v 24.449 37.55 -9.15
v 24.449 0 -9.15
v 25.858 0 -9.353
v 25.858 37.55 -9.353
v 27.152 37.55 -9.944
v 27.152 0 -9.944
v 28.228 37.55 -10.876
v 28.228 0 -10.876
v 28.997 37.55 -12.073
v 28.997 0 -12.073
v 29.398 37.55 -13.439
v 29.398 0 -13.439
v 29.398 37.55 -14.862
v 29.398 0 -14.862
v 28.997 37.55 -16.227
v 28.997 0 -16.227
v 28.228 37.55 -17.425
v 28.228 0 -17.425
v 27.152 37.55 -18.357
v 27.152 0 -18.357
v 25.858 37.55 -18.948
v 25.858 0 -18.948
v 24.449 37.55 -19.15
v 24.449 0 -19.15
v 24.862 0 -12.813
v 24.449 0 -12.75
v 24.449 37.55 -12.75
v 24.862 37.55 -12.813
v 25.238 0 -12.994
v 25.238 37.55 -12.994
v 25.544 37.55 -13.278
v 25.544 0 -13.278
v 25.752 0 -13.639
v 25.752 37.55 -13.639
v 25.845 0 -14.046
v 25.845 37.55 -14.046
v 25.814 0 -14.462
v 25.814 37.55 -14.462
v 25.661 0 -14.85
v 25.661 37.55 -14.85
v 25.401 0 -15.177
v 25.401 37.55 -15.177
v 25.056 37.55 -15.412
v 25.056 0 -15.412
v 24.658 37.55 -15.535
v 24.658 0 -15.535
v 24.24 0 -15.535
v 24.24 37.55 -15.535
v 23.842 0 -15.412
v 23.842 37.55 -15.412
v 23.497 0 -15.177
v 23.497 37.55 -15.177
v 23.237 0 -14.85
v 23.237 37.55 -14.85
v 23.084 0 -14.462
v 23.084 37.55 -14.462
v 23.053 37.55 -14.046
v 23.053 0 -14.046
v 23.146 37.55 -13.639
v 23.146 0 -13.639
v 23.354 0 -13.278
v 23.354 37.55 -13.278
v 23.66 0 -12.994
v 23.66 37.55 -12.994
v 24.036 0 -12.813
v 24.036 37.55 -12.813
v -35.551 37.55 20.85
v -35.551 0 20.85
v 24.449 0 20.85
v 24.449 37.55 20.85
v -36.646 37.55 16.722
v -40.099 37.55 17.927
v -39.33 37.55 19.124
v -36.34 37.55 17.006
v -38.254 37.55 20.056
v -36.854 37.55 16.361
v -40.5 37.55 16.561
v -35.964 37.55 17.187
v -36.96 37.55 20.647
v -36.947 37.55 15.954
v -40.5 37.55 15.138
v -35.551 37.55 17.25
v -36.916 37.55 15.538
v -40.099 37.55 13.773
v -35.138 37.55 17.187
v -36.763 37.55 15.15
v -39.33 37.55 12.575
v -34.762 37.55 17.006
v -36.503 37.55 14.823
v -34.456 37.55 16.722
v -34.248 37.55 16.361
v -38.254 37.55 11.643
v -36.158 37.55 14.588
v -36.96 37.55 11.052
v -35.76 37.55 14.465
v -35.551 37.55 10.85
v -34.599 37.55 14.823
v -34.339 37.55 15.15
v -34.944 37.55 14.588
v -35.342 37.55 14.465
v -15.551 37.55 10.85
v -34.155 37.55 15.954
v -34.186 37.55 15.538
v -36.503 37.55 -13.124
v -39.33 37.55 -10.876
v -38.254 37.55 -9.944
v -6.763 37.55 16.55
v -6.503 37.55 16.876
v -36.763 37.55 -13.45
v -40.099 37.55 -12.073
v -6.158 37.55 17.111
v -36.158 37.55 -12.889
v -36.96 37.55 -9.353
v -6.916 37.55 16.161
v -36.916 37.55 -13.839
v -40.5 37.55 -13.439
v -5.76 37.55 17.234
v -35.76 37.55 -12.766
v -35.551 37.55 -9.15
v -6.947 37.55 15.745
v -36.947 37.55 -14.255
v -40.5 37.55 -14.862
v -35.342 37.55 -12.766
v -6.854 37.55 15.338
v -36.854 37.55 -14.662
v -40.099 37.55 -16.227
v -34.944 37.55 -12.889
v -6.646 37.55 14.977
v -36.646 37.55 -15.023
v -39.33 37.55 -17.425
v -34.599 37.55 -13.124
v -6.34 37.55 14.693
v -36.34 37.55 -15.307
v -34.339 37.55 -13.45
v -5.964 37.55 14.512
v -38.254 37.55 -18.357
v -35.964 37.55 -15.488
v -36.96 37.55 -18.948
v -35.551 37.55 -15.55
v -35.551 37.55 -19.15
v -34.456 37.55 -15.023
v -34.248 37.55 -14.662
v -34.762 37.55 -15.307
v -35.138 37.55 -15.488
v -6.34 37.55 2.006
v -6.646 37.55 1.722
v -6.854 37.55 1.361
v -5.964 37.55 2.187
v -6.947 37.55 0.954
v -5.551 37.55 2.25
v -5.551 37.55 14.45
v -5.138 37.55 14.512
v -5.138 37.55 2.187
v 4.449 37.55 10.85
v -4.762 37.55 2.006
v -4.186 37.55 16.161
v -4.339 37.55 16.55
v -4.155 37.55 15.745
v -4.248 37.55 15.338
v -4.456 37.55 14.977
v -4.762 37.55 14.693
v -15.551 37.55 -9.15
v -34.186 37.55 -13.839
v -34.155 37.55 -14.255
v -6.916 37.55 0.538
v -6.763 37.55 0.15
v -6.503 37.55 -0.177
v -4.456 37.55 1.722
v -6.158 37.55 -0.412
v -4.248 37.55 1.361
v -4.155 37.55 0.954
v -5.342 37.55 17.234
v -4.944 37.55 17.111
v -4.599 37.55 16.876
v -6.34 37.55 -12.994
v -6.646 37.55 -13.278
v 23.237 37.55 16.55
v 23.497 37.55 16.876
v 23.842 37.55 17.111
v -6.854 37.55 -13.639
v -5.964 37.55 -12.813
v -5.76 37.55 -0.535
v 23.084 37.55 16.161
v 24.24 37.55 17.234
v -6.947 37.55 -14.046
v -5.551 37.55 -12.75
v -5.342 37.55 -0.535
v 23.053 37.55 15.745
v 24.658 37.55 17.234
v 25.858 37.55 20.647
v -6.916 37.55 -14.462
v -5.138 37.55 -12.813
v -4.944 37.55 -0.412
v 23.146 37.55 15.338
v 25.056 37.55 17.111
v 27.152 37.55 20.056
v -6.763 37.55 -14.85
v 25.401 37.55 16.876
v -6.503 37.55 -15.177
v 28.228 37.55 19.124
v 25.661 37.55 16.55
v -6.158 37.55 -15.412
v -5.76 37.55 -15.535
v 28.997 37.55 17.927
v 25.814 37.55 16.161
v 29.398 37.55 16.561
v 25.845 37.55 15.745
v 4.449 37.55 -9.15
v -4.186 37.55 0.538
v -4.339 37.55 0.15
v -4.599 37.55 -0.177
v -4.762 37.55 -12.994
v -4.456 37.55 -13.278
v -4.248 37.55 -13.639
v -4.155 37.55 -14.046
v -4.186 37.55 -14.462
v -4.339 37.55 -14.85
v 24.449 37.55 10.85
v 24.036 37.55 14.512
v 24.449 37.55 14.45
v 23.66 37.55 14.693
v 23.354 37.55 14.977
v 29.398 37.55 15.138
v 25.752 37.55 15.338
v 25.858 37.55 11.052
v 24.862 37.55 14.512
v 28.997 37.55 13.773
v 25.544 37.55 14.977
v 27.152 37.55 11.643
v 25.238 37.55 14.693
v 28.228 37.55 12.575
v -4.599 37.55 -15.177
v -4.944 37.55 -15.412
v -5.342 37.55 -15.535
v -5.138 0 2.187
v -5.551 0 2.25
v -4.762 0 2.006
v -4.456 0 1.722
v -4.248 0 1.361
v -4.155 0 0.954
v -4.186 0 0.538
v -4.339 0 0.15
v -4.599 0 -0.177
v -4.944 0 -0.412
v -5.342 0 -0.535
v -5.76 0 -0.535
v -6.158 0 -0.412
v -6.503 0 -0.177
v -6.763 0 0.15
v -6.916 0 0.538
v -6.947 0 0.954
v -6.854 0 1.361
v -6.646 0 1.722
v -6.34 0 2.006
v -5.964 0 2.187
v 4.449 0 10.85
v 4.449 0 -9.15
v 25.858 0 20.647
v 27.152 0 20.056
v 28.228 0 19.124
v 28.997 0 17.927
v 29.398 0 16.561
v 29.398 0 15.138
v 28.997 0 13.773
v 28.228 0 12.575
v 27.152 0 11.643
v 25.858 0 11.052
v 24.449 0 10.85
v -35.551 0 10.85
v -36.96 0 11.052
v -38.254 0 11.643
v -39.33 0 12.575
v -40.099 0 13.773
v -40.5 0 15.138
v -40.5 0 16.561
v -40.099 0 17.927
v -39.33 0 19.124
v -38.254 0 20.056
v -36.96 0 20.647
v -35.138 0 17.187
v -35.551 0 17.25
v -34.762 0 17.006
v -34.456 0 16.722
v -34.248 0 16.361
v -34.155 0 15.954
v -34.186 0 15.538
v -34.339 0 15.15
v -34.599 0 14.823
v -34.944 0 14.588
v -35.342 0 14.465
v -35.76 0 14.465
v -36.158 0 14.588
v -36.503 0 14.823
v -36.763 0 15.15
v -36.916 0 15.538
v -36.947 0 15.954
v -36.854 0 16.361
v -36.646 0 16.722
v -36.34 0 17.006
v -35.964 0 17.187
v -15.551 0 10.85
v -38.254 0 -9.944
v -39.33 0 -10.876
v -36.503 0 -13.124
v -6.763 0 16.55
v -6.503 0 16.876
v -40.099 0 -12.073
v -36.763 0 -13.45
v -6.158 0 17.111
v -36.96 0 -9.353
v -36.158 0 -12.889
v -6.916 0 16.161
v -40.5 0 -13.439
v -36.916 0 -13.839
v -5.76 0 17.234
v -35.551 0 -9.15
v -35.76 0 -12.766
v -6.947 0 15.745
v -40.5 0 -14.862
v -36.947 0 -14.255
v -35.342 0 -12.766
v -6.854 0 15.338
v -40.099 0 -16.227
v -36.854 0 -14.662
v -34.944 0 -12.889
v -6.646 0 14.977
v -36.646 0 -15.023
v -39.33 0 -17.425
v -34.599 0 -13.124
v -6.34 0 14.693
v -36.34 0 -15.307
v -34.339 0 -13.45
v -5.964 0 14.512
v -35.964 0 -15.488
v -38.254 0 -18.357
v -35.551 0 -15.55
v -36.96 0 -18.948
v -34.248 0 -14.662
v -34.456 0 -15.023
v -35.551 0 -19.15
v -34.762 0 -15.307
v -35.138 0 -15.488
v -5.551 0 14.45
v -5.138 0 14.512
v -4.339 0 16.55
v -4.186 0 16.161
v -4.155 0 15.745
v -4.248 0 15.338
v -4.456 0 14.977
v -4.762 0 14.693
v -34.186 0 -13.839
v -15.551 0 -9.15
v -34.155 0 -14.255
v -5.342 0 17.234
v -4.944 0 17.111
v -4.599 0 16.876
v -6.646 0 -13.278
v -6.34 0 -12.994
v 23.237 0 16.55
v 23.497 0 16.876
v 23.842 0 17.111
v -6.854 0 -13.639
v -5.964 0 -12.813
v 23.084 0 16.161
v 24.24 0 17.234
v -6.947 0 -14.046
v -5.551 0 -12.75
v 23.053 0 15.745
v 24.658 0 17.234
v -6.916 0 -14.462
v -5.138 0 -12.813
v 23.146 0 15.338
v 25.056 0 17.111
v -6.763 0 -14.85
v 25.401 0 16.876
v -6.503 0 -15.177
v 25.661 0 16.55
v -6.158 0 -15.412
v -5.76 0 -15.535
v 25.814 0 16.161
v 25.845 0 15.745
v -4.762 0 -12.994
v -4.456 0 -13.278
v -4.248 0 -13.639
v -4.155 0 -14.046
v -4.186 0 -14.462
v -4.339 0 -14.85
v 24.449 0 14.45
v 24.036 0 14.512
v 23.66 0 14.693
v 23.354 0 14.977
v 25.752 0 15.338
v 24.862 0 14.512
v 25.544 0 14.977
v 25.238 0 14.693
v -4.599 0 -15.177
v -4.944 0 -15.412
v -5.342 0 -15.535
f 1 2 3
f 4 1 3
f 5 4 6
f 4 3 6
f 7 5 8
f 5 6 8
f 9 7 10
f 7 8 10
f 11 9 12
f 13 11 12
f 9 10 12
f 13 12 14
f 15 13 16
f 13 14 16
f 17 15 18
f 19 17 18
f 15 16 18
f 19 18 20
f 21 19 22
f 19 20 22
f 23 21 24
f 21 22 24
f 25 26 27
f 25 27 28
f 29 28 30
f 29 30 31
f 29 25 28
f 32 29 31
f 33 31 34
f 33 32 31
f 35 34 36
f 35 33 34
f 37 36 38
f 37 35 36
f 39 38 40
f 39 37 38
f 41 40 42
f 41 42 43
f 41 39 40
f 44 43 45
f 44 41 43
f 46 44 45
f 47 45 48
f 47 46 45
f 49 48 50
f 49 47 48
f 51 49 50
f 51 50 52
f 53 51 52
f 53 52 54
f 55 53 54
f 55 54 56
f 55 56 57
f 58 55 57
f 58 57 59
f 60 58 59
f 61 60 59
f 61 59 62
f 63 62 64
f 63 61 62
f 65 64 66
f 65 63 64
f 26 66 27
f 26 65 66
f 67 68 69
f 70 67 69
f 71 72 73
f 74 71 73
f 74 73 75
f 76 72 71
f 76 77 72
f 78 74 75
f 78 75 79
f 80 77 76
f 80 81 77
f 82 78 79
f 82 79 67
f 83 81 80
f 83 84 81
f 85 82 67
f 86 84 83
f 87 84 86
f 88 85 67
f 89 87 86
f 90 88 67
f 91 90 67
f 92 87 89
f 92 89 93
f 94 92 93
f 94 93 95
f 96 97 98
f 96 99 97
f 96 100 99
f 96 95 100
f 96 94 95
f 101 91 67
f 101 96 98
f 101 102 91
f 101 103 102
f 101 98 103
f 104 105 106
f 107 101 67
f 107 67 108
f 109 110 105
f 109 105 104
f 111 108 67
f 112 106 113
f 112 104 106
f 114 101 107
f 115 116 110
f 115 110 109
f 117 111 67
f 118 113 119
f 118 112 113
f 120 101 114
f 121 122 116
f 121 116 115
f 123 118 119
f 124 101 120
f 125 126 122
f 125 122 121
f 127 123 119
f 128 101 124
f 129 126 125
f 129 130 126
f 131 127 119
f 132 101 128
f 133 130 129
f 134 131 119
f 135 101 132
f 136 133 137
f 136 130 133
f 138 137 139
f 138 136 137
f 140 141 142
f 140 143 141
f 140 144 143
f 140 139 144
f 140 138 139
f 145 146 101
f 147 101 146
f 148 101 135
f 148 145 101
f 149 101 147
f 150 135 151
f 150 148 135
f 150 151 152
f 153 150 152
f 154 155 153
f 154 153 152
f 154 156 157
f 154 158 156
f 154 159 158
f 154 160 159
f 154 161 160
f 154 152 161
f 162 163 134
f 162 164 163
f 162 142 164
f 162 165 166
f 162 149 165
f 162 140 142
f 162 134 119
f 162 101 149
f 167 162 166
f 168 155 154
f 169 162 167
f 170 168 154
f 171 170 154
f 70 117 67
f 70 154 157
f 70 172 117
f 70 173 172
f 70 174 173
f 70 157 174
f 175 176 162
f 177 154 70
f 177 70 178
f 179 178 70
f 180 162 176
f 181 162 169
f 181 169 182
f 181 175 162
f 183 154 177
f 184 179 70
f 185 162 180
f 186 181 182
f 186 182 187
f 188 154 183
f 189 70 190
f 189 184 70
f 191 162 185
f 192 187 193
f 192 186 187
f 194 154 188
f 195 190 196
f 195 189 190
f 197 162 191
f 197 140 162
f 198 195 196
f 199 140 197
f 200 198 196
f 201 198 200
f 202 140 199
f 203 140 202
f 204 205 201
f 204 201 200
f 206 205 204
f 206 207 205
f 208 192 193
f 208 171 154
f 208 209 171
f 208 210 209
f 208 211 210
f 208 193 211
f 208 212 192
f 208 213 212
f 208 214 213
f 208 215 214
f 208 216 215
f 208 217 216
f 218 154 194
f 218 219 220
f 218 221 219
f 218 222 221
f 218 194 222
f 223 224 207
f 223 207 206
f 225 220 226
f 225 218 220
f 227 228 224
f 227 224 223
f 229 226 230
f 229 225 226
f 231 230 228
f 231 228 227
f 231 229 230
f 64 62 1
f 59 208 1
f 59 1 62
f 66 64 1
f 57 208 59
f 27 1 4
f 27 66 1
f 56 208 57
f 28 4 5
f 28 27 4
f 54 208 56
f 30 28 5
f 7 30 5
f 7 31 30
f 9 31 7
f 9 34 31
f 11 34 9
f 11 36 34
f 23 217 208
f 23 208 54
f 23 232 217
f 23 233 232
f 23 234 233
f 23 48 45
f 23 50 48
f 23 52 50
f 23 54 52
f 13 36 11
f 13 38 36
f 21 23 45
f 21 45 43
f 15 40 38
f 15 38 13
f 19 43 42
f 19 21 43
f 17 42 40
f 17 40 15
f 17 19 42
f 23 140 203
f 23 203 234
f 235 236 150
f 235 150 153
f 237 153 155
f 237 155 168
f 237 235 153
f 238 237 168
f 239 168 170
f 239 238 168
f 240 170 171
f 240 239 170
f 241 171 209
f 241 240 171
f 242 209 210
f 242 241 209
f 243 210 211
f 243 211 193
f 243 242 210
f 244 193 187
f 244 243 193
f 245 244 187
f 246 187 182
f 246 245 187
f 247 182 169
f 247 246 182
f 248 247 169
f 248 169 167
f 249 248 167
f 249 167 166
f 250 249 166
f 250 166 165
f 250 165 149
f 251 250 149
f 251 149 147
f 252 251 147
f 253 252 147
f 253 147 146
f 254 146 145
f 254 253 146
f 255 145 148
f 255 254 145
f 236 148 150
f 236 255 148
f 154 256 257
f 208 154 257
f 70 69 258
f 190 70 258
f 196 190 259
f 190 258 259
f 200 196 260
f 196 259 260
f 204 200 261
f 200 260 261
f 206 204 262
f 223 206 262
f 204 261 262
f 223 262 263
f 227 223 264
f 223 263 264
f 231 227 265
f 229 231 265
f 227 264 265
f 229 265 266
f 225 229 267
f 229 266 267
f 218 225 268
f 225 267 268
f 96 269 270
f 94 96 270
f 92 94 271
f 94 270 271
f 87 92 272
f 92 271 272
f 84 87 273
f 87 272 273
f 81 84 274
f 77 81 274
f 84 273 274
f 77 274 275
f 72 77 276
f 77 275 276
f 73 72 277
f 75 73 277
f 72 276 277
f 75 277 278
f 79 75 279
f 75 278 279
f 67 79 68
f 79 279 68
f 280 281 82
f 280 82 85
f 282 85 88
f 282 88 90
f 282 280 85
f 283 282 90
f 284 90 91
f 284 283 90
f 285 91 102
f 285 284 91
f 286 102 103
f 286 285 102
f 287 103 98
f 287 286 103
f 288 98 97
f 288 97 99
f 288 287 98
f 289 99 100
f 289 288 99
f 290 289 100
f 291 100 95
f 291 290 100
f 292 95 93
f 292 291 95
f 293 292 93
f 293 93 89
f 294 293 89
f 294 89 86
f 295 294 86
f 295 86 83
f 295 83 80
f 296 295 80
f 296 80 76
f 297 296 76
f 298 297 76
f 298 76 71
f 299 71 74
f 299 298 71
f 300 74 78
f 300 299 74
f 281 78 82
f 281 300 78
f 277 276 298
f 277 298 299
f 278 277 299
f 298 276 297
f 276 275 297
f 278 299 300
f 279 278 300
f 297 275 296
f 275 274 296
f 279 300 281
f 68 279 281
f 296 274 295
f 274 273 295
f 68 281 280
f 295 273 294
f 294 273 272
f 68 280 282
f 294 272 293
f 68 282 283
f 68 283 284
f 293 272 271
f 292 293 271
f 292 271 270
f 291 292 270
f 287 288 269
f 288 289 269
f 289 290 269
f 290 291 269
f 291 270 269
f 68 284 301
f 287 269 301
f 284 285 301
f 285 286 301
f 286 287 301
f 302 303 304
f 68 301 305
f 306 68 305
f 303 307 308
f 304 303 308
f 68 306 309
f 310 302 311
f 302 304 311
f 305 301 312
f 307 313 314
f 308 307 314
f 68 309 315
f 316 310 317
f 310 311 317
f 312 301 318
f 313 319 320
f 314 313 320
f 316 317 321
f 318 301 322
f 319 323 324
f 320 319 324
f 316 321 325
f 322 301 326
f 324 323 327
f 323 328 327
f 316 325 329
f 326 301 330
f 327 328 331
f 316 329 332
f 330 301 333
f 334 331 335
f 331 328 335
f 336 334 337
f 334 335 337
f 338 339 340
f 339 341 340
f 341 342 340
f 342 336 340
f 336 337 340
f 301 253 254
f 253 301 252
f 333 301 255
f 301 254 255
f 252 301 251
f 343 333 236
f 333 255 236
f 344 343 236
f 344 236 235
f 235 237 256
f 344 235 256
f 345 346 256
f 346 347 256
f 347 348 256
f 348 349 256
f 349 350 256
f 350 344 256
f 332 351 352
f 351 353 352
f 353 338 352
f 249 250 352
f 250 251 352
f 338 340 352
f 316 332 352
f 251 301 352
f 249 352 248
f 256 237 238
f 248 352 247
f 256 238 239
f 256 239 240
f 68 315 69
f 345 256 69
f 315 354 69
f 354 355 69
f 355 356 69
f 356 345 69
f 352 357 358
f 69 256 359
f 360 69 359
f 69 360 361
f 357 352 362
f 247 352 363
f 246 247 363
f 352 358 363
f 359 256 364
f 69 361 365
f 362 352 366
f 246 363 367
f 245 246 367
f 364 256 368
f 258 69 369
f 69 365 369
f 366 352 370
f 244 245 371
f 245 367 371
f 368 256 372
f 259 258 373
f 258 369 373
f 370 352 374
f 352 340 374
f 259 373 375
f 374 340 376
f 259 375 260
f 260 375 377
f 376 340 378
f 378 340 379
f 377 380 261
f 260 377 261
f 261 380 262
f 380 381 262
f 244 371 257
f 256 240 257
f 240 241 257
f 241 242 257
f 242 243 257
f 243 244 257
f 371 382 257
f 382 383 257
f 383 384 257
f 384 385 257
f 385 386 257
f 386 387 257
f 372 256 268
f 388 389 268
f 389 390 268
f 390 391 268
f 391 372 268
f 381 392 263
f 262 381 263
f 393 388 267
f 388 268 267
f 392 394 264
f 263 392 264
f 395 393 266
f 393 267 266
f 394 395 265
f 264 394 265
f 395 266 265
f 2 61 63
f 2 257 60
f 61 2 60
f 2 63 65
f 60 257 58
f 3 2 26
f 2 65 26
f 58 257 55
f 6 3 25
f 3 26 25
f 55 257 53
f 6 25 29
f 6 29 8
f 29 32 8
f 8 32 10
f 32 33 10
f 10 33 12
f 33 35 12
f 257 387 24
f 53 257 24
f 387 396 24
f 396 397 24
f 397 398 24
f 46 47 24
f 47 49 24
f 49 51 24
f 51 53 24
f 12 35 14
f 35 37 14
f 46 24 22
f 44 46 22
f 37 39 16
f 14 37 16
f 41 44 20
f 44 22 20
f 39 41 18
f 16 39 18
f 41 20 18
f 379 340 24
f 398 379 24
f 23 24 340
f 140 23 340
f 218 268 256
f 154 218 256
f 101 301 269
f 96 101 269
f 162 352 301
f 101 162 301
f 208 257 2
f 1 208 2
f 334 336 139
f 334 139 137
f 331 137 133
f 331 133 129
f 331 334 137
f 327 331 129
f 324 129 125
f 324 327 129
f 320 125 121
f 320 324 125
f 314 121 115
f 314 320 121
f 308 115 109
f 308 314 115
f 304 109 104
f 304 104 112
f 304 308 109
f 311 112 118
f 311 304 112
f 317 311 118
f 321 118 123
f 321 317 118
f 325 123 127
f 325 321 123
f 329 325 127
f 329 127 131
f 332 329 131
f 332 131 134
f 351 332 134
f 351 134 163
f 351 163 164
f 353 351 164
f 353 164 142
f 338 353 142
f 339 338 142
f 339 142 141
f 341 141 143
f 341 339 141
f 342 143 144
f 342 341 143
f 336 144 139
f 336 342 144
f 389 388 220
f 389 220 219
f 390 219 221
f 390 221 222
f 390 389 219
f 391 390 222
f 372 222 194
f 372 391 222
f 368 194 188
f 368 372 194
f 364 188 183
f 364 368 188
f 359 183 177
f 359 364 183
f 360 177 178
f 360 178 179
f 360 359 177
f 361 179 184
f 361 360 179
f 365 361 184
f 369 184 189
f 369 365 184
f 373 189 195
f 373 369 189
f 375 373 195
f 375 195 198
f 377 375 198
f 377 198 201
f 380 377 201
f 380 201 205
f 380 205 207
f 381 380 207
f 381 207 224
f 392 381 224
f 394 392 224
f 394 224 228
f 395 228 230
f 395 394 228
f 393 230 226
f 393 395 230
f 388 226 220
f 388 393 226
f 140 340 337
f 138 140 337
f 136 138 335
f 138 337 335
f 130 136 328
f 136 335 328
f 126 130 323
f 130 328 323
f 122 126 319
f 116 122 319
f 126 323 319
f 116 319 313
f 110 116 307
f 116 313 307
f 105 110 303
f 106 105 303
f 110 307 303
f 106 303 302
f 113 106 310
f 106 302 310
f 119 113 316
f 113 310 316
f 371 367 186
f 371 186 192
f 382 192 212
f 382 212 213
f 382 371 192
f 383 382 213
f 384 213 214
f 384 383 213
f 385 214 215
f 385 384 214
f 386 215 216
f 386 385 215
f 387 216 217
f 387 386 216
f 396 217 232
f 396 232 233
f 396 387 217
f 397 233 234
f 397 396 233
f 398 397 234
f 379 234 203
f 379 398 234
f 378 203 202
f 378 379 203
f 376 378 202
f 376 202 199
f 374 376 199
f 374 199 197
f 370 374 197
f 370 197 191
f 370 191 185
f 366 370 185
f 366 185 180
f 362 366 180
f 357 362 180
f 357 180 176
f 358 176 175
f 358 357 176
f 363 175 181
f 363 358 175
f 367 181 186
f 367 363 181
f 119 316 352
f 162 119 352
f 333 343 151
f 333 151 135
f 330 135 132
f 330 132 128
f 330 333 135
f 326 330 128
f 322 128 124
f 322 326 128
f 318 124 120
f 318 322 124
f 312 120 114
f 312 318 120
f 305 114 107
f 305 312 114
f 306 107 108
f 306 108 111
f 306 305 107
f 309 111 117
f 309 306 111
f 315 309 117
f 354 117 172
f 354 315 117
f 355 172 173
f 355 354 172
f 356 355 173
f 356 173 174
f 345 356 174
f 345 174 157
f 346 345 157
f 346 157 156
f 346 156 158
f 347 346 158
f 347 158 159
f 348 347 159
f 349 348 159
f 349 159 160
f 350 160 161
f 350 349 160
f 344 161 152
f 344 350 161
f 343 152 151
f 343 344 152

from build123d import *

# Parameters (mm, degrees)
SKETCH_1_R      = 1.4
EXTRUDE_1_DEPTH = 37.55


with BuildPart() as part:
    # 草图1 → 凸台-拉伸1 (new body)
    with BuildSketch(Plane(origin=(0, 0, 0), x_dir=(1, 0, 0), z_dir=(0, 1, 0))):
        with BuildLine():
            Line((4.448985647, -10.849582747), (4.448985647, 9.150417253))
            Line((4.448985647, 9.150417253), (24.448985647, 9.150417253))
            ThreePointArc((24.448985647, 9.150417253), (29.448985647, 14.150417253), (24.448985647, 19.150417253))
            Line((24.448985647, 19.150417253), (-35.551014353, 19.150417253))
            ThreePointArc((-35.551014353, 19.150417253), (-40.551014353, 14.150417253), (-35.551014353, 9.150417253))
            Line((-35.551014353, 9.150417253), (-15.551014353, 9.150417253))
            Line((-15.551014353, 9.150417253), (-15.551014353, -10.849582747))
            Line((-15.551014353, -10.849582747), (-35.551014353, -10.849582747))
            ThreePointArc((-35.551014353, -10.849582747), (-40.551014353, -15.849582747), (-35.551014353, -20.849582747))
            Line((-35.551014353, -20.849582747), (24.448985647, -20.849582747))
            ThreePointArc((24.448985647, -20.849582747), (29.448985647, -15.849582747), (24.448985647, -10.849582747))
            Line((24.448985647, -10.849582747), (4.448985647, -10.849582747))
        make_face()
        with Locations(Location((24.448985647, 14.150417253, 0), (0, 0, 270))):
            Circle(SKETCH_1_R, mode=Mode.SUBTRACT)
        with Locations(Location((24.448985647, -15.849582747, 0), (0, 0, 90))):
            Circle(SKETCH_1_R, mode=Mode.SUBTRACT)
        with Locations(Location((-5.551014353, 14.150417253, 0), (0, 0, 270))):
            Circle(SKETCH_1_R, mode=Mode.SUBTRACT)
        with Locations(Location((-5.551014353, -0.849582747, 0), (0, 0, 270))):
            Circle(SKETCH_1_R, mode=Mode.SUBTRACT)
        with Locations(Location((-5.551014353, -15.849582747, 0), (0, 0, 90))):
            Circle(SKETCH_1_R, mode=Mode.SUBTRACT)
        with Locations(Location((-35.551014353, -15.849582747, 0), (0, 0, 270))):
            Circle(SKETCH_1_R, mode=Mode.SUBTRACT)
        with Locations(Location((-35.551014353, 14.150417253, 0), (0, 0, 90))):
            Circle(SKETCH_1_R, mode=Mode.SUBTRACT)
    extrude(amount=EXTRUDE_1_DEPTH)


solid = part.part
